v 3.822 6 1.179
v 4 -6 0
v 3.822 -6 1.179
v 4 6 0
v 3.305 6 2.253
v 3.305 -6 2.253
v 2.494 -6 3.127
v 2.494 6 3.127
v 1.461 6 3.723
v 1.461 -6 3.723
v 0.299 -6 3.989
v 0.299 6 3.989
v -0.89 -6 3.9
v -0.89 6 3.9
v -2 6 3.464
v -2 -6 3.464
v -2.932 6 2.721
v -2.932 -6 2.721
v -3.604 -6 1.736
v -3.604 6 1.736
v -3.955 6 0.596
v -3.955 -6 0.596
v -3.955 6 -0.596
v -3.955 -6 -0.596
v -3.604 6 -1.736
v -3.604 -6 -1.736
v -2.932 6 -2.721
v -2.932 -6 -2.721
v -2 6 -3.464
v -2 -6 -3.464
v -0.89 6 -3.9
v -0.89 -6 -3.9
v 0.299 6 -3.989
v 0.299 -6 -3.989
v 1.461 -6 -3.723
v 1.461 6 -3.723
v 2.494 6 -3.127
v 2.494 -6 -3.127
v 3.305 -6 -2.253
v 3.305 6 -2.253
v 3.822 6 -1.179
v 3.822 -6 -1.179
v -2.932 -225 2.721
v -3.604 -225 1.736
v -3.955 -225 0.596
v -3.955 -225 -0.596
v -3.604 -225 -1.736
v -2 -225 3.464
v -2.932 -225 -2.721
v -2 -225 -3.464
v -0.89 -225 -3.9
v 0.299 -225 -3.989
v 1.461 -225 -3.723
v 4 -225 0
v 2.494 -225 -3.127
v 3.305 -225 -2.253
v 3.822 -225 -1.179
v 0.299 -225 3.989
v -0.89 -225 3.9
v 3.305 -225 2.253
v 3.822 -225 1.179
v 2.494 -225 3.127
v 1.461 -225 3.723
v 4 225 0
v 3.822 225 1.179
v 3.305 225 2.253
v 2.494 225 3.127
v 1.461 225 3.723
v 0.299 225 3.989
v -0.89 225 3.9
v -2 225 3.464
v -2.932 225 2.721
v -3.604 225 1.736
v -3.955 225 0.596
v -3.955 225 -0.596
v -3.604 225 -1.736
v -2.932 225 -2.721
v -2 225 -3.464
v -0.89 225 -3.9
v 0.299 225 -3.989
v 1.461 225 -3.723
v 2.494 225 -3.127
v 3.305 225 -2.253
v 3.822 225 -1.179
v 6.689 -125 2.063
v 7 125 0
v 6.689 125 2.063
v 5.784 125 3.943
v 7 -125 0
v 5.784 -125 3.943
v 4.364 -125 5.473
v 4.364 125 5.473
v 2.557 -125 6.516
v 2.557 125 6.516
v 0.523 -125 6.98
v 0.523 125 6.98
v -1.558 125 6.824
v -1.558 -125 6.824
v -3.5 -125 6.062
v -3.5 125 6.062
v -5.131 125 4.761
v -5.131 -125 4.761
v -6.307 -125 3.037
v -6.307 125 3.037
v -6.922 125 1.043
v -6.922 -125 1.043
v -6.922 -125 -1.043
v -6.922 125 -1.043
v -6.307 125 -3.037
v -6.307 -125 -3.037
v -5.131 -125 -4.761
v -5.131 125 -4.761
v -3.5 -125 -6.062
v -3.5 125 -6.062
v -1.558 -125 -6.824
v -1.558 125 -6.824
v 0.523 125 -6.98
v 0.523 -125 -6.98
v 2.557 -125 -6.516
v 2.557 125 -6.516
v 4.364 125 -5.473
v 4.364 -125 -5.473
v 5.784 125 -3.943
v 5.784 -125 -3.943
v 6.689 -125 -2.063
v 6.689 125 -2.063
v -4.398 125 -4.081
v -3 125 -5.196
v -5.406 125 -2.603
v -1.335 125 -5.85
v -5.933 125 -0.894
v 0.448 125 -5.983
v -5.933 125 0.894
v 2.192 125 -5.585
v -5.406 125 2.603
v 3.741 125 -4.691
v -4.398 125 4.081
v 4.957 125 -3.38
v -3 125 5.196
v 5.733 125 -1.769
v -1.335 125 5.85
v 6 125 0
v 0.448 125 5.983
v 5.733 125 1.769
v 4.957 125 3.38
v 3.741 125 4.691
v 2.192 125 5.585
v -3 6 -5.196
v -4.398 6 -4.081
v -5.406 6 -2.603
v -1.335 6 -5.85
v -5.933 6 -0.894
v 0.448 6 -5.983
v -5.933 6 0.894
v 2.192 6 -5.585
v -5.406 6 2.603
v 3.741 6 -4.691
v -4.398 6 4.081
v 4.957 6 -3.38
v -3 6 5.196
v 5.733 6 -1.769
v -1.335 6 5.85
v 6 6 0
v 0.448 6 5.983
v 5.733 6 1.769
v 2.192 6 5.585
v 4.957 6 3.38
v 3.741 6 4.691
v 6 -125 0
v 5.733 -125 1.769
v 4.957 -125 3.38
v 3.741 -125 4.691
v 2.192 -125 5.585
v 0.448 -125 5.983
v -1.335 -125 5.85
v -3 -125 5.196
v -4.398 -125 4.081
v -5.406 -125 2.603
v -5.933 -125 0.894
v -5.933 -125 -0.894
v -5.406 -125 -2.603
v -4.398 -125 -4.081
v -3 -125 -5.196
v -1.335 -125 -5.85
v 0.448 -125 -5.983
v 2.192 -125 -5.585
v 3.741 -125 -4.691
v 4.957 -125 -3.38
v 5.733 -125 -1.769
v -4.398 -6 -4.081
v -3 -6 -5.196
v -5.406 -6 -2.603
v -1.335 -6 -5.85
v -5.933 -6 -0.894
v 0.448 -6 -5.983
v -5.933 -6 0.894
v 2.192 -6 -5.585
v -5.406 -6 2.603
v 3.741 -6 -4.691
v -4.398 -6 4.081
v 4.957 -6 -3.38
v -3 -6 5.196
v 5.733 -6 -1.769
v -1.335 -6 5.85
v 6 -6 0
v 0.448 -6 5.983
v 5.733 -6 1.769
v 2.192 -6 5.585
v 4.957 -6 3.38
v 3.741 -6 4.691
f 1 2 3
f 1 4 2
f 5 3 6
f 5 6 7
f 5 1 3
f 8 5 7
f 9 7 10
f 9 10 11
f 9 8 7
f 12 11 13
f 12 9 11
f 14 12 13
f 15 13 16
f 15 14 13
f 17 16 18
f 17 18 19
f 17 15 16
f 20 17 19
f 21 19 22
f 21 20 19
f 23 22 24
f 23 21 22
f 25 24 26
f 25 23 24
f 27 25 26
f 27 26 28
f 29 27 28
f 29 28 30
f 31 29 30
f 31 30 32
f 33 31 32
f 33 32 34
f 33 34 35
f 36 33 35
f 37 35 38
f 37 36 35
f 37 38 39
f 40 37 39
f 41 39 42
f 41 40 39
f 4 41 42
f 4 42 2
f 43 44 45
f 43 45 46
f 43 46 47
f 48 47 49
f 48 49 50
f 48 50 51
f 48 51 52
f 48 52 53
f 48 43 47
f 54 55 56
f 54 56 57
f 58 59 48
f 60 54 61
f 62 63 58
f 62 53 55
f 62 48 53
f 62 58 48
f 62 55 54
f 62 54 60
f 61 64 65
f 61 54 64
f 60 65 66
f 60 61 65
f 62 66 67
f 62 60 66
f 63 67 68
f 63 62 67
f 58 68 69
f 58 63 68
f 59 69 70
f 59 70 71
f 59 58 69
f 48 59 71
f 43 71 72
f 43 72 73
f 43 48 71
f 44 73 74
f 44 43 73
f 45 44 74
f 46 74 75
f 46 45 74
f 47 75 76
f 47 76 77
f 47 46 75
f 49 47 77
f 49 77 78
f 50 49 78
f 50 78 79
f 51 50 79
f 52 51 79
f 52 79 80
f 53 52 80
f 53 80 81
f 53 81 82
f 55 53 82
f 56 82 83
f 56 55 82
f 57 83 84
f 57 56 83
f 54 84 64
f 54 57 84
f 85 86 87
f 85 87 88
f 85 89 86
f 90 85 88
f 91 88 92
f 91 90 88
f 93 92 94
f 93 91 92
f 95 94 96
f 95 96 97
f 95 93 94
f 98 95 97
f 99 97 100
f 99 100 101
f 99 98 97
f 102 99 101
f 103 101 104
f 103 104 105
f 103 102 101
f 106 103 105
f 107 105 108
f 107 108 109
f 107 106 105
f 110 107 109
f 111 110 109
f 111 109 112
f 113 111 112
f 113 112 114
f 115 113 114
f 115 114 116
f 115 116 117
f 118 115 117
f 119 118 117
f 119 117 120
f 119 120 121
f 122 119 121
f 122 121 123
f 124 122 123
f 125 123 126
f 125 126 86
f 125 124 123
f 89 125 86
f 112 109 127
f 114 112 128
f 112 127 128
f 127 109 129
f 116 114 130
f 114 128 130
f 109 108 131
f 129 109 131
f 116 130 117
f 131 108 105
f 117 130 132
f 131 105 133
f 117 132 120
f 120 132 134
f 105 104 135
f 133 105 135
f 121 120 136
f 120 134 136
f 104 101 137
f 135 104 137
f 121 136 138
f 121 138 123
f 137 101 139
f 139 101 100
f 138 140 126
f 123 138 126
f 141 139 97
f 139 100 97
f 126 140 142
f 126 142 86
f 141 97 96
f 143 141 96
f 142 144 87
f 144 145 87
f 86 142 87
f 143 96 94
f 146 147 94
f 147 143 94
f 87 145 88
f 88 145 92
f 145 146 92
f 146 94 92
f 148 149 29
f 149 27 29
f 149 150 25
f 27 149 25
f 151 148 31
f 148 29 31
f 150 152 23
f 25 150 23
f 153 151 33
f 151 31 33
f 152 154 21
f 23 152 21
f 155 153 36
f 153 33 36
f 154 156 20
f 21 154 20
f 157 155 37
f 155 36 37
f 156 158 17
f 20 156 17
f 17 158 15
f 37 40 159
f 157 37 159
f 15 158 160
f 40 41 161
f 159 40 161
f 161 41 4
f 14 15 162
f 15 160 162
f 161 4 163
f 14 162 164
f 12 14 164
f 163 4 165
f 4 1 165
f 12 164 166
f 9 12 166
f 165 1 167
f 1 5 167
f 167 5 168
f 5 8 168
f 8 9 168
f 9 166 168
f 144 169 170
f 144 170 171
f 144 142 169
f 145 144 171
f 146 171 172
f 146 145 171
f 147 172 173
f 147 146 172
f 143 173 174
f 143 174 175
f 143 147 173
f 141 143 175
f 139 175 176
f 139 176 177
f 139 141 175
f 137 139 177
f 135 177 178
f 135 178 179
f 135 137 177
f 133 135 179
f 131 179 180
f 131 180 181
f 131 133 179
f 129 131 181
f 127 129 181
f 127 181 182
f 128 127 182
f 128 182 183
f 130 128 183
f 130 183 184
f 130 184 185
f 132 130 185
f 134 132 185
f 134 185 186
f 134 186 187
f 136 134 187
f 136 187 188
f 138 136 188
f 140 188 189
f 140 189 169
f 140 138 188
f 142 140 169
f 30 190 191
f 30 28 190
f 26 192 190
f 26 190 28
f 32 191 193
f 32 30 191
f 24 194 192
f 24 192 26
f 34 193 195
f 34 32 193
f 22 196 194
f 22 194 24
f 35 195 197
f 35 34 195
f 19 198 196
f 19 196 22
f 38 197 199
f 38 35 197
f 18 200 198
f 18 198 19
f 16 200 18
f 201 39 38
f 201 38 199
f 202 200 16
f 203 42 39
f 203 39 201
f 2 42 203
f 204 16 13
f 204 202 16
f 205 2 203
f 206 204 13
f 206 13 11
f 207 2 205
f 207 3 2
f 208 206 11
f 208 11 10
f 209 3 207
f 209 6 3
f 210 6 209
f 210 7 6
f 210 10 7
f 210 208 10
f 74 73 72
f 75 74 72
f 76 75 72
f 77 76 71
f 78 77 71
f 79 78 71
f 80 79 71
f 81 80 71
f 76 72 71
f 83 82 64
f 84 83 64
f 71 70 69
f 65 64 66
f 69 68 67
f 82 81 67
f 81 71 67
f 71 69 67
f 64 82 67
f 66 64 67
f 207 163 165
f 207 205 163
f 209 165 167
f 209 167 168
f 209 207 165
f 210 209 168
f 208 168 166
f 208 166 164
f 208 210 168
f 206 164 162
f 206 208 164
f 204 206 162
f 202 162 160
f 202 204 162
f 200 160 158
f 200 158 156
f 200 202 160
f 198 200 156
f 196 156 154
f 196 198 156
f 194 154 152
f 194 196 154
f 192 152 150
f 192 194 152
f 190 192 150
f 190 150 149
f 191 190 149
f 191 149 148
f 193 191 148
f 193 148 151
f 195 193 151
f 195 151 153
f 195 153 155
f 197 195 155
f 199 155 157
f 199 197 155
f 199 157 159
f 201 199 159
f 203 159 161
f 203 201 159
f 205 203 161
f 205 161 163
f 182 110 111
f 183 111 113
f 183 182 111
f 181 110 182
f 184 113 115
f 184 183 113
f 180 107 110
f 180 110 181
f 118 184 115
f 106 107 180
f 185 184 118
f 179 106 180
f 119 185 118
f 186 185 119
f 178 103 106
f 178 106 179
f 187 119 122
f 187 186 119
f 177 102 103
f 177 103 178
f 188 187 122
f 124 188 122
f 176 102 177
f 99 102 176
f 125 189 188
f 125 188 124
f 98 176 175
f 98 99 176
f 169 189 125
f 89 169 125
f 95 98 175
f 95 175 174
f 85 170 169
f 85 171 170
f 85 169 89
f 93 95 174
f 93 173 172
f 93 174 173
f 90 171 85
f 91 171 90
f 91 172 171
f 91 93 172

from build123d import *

# Parameters (mm, degrees)
F0_R     = 4
F1_DEPTH = 225
F0_R_2   = 6
F2_DEPTH = 6
F0_R_3   = 7
F3_DEPTH = 125


with BuildPart() as f1:
    # F0 (on Front) → F1 (new body, symmetric)
    with BuildSketch(Plane.XZ):
        Circle(F0_R)
    extrude(amount=F1_DEPTH, both=True)


with BuildPart() as f2:
    # F0 (on Front) → F2 (new body, symmetric)
    with BuildSketch(Plane.XZ):
        Circle(F0_R_2)
        Circle(F0_R, mode=Mode.SUBTRACT)
    extrude(amount=F2_DEPTH, both=True)


with BuildPart() as f3:
    # F0 (on Front) → F3 (new body, symmetric)
    with BuildSketch(Plane.XZ):
        Circle(F0_R_3)
        Circle(F0_R_2, mode=Mode.SUBTRACT)
    extrude(amount=F3_DEPTH, both=True)


solid = Compound([f1.part, f2.part, f3.part])
